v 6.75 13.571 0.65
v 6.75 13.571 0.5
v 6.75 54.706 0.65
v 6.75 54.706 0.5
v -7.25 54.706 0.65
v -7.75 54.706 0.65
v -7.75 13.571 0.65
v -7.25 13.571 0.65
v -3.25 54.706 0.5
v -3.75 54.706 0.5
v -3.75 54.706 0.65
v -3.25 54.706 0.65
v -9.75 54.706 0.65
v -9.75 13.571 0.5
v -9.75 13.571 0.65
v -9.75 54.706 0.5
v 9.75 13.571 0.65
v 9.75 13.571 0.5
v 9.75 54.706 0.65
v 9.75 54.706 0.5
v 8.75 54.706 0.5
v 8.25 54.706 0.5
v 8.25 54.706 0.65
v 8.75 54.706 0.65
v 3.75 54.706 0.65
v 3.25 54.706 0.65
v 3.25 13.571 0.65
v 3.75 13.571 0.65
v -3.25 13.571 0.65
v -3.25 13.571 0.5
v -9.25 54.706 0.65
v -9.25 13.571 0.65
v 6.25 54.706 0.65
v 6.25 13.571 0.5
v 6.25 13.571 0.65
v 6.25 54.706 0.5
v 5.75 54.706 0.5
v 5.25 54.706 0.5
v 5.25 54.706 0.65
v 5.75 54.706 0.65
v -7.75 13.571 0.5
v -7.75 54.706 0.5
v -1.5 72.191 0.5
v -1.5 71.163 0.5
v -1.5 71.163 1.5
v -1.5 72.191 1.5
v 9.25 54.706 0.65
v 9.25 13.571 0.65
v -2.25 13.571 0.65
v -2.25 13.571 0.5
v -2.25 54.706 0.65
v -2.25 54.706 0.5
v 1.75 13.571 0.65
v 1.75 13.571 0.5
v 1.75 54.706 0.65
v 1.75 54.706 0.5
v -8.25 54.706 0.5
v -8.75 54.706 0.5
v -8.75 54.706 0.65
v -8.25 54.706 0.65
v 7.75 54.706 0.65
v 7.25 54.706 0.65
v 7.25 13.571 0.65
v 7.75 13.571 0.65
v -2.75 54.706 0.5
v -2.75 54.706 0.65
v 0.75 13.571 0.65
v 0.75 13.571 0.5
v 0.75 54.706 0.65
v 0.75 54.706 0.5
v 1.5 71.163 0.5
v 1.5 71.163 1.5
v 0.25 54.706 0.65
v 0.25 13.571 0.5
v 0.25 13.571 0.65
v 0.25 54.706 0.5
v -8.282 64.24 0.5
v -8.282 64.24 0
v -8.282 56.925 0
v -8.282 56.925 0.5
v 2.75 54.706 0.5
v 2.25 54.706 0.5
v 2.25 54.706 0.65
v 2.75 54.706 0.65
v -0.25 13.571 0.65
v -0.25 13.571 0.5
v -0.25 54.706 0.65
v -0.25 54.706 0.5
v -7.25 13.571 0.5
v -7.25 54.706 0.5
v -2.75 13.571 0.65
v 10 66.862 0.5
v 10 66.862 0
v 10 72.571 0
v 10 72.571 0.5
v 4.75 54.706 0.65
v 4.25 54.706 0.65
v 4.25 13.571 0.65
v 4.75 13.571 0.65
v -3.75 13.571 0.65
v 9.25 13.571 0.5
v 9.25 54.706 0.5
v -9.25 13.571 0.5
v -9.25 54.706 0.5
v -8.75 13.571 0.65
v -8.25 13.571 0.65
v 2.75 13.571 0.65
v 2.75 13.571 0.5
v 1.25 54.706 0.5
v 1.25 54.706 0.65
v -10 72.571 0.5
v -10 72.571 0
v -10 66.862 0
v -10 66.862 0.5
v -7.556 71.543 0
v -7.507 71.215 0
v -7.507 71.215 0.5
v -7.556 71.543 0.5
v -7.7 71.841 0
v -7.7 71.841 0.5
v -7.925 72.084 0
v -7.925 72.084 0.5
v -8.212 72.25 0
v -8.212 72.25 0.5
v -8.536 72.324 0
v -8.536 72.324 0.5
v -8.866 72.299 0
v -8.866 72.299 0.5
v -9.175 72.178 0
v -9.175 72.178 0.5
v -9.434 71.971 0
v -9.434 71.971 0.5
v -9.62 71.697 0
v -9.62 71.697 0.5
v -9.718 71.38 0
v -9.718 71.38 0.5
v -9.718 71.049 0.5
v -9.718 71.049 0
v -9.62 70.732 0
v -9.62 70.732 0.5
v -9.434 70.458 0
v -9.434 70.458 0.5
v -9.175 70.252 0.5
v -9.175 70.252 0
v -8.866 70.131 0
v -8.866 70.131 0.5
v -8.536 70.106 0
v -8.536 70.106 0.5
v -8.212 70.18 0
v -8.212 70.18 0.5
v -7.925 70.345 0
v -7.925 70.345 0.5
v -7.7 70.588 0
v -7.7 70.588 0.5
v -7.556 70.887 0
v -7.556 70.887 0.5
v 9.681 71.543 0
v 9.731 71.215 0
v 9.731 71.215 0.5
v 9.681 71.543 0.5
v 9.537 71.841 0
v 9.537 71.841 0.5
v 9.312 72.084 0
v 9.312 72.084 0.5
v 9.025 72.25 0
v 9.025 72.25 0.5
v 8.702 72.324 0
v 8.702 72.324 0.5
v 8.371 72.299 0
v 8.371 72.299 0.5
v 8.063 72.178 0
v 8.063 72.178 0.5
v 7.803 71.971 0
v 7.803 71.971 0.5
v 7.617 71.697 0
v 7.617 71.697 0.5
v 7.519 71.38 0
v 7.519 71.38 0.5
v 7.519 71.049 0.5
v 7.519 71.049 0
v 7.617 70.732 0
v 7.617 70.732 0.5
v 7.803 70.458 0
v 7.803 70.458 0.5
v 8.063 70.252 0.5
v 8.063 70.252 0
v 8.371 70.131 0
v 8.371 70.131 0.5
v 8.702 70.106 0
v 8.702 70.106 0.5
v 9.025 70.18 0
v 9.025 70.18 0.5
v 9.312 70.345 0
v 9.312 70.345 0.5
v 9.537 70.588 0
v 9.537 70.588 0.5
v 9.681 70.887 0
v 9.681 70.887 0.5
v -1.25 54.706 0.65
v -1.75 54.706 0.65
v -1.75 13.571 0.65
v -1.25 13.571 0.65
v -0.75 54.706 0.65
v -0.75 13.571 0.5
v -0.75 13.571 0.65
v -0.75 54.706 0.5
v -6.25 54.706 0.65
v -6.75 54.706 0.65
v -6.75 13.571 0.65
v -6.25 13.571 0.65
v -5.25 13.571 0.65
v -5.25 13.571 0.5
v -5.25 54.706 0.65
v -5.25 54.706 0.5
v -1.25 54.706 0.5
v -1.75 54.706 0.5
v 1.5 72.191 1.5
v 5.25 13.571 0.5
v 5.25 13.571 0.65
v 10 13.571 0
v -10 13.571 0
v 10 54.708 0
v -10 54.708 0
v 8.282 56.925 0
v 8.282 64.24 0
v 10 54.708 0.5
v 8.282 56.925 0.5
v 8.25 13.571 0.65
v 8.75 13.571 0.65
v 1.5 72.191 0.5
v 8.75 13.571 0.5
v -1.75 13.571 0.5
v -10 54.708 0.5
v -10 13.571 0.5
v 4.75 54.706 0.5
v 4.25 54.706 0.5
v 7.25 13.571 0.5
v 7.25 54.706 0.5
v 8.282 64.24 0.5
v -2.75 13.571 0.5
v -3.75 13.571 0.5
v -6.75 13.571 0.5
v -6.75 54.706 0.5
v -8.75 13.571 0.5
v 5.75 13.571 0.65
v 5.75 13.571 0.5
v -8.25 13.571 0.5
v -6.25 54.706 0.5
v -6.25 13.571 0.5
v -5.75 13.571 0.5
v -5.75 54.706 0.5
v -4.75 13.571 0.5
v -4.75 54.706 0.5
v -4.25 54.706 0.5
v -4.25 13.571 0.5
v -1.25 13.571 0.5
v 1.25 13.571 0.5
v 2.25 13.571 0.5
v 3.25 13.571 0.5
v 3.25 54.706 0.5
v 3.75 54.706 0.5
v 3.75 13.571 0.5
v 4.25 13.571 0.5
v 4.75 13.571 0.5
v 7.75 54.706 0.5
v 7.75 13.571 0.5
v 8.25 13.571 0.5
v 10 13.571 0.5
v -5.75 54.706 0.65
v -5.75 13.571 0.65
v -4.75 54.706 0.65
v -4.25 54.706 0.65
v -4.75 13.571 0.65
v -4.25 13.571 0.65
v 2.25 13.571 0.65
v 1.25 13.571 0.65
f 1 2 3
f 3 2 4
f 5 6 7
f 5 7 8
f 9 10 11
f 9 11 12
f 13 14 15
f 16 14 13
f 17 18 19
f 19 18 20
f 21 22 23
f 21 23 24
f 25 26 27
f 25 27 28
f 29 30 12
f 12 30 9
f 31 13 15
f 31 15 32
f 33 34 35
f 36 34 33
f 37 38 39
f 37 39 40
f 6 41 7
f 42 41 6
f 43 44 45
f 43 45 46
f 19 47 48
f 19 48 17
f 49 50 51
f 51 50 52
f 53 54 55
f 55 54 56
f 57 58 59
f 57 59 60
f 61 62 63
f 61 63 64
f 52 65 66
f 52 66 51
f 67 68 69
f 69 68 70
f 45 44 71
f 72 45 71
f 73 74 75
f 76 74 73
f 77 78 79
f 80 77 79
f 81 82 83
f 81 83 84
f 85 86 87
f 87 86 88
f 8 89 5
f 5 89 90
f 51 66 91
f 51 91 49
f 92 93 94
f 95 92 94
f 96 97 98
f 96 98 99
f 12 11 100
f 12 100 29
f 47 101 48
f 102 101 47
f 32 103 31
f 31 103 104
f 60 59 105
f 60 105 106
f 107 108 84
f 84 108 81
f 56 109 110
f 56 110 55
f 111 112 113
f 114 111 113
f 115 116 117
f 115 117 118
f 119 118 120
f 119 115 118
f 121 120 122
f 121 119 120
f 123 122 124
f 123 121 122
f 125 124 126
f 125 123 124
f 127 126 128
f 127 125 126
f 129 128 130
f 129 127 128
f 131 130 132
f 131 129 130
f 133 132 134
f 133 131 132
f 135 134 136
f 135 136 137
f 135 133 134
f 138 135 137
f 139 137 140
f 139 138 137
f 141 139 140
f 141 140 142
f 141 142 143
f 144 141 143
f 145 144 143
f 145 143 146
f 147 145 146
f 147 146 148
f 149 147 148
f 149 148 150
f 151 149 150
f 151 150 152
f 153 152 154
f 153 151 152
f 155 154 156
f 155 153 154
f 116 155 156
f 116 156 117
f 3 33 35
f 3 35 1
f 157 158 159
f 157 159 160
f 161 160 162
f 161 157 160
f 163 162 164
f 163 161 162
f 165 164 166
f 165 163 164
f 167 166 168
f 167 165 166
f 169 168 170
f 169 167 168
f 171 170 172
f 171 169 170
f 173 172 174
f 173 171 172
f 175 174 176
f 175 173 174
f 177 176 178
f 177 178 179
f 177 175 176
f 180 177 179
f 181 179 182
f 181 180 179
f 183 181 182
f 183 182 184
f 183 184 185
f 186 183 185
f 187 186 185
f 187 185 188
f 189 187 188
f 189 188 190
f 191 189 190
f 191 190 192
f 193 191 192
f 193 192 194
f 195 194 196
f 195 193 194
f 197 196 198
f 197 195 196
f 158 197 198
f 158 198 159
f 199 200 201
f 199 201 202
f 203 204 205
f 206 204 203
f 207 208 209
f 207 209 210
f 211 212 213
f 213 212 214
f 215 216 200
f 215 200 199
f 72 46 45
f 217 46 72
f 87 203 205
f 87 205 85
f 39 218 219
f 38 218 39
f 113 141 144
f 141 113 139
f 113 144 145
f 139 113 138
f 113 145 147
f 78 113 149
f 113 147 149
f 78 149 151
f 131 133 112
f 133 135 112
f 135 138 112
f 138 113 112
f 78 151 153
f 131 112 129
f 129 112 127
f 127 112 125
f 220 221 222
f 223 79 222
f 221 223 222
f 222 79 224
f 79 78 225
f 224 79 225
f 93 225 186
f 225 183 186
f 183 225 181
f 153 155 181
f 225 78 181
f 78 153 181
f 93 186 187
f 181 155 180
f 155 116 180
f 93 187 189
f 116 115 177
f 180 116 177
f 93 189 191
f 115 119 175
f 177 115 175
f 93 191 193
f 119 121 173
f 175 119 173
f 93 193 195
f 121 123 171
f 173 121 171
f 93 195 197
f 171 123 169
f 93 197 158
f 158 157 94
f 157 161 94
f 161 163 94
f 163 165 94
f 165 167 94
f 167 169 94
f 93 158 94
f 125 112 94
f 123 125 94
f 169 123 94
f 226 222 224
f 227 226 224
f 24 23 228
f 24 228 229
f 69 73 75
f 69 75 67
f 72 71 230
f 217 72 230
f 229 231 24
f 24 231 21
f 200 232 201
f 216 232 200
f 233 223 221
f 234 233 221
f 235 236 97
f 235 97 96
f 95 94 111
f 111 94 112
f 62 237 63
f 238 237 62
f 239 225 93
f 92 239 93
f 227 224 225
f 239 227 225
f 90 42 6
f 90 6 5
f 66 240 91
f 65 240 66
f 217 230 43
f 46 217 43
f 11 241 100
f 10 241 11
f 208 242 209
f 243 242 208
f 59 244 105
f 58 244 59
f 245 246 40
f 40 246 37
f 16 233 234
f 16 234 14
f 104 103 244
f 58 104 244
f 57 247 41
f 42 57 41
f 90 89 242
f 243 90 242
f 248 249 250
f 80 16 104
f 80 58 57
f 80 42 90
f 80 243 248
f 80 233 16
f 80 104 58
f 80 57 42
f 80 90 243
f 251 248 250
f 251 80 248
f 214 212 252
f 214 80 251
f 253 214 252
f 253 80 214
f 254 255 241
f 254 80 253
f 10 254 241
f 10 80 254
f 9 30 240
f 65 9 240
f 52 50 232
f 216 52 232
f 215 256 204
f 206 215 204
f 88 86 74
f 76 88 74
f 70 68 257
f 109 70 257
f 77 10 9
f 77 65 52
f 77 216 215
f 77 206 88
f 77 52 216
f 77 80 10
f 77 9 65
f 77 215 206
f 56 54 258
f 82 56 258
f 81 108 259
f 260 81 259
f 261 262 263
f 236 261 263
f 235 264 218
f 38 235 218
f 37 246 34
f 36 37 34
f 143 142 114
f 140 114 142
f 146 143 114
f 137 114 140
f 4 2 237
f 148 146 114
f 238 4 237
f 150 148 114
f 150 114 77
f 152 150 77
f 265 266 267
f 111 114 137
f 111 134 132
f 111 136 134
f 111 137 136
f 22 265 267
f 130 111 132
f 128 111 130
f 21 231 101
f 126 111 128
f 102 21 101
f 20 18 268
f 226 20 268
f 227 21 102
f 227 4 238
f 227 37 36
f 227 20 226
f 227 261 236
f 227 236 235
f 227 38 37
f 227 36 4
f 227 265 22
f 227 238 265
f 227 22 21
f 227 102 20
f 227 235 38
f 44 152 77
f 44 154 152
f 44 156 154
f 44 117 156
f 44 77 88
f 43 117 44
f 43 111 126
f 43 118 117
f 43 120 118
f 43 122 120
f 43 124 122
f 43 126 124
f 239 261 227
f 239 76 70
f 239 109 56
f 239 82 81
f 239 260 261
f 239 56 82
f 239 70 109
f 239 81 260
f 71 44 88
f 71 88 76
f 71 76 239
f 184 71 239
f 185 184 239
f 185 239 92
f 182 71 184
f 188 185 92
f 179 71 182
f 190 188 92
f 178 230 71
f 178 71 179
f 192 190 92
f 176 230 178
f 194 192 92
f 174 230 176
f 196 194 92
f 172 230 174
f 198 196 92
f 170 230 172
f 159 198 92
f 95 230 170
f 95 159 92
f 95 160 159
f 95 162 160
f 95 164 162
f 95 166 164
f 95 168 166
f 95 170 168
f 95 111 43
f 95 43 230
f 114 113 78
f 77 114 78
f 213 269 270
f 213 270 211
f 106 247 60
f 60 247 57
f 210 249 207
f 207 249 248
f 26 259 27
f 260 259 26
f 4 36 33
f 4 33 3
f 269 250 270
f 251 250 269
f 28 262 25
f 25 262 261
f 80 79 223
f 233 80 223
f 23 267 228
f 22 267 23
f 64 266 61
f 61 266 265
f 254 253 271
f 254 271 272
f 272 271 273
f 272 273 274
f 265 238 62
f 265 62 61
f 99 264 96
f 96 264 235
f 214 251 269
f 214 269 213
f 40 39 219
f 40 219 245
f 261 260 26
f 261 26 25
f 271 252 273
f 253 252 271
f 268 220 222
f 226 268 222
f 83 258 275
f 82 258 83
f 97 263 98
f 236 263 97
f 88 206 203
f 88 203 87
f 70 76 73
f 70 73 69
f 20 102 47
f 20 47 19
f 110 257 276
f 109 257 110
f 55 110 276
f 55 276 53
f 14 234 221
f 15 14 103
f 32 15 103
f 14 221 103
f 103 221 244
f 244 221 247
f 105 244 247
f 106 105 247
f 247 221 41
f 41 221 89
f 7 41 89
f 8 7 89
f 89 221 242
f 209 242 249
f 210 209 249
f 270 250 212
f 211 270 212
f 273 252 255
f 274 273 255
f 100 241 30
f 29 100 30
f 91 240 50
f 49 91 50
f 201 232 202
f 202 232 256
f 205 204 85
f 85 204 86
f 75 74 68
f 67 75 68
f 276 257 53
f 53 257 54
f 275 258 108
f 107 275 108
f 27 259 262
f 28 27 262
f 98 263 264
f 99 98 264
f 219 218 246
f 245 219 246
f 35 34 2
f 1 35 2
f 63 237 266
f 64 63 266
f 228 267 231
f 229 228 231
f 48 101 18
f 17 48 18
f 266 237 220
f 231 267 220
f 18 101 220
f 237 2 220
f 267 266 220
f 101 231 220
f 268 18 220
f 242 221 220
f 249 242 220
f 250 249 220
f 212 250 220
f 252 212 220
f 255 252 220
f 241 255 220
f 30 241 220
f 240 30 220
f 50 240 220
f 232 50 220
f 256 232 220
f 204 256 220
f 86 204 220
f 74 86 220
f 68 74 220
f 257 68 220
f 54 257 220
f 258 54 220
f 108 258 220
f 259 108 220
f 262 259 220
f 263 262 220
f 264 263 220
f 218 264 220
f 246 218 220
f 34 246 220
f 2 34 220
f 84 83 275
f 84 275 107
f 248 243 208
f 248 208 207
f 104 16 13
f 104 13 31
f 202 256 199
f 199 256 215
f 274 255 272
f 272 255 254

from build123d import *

# Parameters (mm, degrees)
SKETCH2_R           = 1.112004448
BOSS_EXTRUDE1_DEPTH = 0.5
SKETCH3_W           = 0.5
SKETCH3_H           = 41.135021261
BOSS_EXTRUDE2_DEPTH = 0.15
SKETCH4_W           = 1.5
SKETCH4_H           = 1.027696227
BOSS_EXTRUDE3_DEPTH = 1


with BuildPart() as part:
    # Sketch2 → Boss-Extrude1 (new body)
    with BuildSketch(Plane.XY):
        Polygon((-10, 13.571131009), (10, 13.571131009), (10, 54.708363732), (8.281546087, 56.925194639), (8.281546087, 64.240363418), (10, 66.862498938), (10, 72.571131009), (-10, 72.571131009), (-10, 66.862498938), (-8.281546087, 64.240363418), (-8.281546087, 56.925194639), (-10, 54.708363732), align=None)
        with Locations((8.618613348, 71.214744162)):
            Circle(SKETCH2_R, mode=Mode.SUBTRACT)
        with Locations((-8.618613348, 71.214744162)):
            Circle(SKETCH2_R, mode=Mode.SUBTRACT)
    extrude(amount=BOSS_EXTRUDE1_DEPTH)

    # Sketch3 → Boss-Extrude2 (add)
    with BuildSketch(Plane.XY.offset(0.5)):
        with Locations((-9.5, 34.13864164)):
            Rectangle(SKETCH3_W, SKETCH3_H)
        with Locations((-8.5, 34.13864164)):
            Rectangle(SKETCH3_W, SKETCH3_H)
        with Locations((-7.5, 34.13864164)):
            Rectangle(SKETCH3_W, SKETCH3_H)
        with Locations((-6.5, 34.13864164)):
            Rectangle(SKETCH3_W, SKETCH3_H)
        with Locations((-5.5, 34.13864164)):
            Rectangle(SKETCH3_W, SKETCH3_H)
        with Locations((-4.5, 34.13864164)):
            Rectangle(SKETCH3_W, SKETCH3_H)
        with Locations((-3.5, 34.13864164)):
            Rectangle(SKETCH3_W, SKETCH3_H)
        with Locations((-2.5, 34.13864164)):
            Rectangle(SKETCH3_W, SKETCH3_H)
        with Locations((-1.5, 34.13864164)):
            Rectangle(SKETCH3_W, SKETCH3_H)
        with Locations((-0.5, 34.13864164)):
            Rectangle(SKETCH3_W, SKETCH3_H)
        with Locations((0.5, 34.13864164)):
            Rectangle(SKETCH3_W, SKETCH3_H)
        with Locations((1.5, 34.13864164)):
            Rectangle(SKETCH3_W, SKETCH3_H)
        with Locations((2.5, 34.13864164)):
            Rectangle(SKETCH3_W, SKETCH3_H)
        with Locations((3.5, 34.13864164)):
            Rectangle(SKETCH3_W, SKETCH3_H)
        with Locations((4.5, 34.13864164)):
            Rectangle(SKETCH3_W, SKETCH3_H)
        with Locations((5.5, 34.13864164)):
            Rectangle(SKETCH3_W, SKETCH3_H)
        with Locations((6.5, 34.13864164)):
            Rectangle(SKETCH3_W, SKETCH3_H)
        with Locations((7.5, 34.13864164)):
            Rectangle(SKETCH3_W, SKETCH3_H)
        with Locations((8.5, 34.13864164)):
            Rectangle(SKETCH3_W, SKETCH3_H)
        with Locations((9.5, 34.13864164)):
            Rectangle(SKETCH3_W, SKETCH3_H)
    extrude(amount=BOSS_EXTRUDE2_DEPTH)

    # Sketch4 → Boss-Extrude3 (add)
    with BuildSketch(Plane.XY.offset(0.5)):
        with Locations((-0.75, 71.676816486)):
            Rectangle(SKETCH4_W, SKETCH4_H)
        with Locations((0.75, 71.676816486)):
            Rectangle(SKETCH4_W, SKETCH4_H)
    extrude(amount=BOSS_EXTRUDE3_DEPTH)


solid = part.part
